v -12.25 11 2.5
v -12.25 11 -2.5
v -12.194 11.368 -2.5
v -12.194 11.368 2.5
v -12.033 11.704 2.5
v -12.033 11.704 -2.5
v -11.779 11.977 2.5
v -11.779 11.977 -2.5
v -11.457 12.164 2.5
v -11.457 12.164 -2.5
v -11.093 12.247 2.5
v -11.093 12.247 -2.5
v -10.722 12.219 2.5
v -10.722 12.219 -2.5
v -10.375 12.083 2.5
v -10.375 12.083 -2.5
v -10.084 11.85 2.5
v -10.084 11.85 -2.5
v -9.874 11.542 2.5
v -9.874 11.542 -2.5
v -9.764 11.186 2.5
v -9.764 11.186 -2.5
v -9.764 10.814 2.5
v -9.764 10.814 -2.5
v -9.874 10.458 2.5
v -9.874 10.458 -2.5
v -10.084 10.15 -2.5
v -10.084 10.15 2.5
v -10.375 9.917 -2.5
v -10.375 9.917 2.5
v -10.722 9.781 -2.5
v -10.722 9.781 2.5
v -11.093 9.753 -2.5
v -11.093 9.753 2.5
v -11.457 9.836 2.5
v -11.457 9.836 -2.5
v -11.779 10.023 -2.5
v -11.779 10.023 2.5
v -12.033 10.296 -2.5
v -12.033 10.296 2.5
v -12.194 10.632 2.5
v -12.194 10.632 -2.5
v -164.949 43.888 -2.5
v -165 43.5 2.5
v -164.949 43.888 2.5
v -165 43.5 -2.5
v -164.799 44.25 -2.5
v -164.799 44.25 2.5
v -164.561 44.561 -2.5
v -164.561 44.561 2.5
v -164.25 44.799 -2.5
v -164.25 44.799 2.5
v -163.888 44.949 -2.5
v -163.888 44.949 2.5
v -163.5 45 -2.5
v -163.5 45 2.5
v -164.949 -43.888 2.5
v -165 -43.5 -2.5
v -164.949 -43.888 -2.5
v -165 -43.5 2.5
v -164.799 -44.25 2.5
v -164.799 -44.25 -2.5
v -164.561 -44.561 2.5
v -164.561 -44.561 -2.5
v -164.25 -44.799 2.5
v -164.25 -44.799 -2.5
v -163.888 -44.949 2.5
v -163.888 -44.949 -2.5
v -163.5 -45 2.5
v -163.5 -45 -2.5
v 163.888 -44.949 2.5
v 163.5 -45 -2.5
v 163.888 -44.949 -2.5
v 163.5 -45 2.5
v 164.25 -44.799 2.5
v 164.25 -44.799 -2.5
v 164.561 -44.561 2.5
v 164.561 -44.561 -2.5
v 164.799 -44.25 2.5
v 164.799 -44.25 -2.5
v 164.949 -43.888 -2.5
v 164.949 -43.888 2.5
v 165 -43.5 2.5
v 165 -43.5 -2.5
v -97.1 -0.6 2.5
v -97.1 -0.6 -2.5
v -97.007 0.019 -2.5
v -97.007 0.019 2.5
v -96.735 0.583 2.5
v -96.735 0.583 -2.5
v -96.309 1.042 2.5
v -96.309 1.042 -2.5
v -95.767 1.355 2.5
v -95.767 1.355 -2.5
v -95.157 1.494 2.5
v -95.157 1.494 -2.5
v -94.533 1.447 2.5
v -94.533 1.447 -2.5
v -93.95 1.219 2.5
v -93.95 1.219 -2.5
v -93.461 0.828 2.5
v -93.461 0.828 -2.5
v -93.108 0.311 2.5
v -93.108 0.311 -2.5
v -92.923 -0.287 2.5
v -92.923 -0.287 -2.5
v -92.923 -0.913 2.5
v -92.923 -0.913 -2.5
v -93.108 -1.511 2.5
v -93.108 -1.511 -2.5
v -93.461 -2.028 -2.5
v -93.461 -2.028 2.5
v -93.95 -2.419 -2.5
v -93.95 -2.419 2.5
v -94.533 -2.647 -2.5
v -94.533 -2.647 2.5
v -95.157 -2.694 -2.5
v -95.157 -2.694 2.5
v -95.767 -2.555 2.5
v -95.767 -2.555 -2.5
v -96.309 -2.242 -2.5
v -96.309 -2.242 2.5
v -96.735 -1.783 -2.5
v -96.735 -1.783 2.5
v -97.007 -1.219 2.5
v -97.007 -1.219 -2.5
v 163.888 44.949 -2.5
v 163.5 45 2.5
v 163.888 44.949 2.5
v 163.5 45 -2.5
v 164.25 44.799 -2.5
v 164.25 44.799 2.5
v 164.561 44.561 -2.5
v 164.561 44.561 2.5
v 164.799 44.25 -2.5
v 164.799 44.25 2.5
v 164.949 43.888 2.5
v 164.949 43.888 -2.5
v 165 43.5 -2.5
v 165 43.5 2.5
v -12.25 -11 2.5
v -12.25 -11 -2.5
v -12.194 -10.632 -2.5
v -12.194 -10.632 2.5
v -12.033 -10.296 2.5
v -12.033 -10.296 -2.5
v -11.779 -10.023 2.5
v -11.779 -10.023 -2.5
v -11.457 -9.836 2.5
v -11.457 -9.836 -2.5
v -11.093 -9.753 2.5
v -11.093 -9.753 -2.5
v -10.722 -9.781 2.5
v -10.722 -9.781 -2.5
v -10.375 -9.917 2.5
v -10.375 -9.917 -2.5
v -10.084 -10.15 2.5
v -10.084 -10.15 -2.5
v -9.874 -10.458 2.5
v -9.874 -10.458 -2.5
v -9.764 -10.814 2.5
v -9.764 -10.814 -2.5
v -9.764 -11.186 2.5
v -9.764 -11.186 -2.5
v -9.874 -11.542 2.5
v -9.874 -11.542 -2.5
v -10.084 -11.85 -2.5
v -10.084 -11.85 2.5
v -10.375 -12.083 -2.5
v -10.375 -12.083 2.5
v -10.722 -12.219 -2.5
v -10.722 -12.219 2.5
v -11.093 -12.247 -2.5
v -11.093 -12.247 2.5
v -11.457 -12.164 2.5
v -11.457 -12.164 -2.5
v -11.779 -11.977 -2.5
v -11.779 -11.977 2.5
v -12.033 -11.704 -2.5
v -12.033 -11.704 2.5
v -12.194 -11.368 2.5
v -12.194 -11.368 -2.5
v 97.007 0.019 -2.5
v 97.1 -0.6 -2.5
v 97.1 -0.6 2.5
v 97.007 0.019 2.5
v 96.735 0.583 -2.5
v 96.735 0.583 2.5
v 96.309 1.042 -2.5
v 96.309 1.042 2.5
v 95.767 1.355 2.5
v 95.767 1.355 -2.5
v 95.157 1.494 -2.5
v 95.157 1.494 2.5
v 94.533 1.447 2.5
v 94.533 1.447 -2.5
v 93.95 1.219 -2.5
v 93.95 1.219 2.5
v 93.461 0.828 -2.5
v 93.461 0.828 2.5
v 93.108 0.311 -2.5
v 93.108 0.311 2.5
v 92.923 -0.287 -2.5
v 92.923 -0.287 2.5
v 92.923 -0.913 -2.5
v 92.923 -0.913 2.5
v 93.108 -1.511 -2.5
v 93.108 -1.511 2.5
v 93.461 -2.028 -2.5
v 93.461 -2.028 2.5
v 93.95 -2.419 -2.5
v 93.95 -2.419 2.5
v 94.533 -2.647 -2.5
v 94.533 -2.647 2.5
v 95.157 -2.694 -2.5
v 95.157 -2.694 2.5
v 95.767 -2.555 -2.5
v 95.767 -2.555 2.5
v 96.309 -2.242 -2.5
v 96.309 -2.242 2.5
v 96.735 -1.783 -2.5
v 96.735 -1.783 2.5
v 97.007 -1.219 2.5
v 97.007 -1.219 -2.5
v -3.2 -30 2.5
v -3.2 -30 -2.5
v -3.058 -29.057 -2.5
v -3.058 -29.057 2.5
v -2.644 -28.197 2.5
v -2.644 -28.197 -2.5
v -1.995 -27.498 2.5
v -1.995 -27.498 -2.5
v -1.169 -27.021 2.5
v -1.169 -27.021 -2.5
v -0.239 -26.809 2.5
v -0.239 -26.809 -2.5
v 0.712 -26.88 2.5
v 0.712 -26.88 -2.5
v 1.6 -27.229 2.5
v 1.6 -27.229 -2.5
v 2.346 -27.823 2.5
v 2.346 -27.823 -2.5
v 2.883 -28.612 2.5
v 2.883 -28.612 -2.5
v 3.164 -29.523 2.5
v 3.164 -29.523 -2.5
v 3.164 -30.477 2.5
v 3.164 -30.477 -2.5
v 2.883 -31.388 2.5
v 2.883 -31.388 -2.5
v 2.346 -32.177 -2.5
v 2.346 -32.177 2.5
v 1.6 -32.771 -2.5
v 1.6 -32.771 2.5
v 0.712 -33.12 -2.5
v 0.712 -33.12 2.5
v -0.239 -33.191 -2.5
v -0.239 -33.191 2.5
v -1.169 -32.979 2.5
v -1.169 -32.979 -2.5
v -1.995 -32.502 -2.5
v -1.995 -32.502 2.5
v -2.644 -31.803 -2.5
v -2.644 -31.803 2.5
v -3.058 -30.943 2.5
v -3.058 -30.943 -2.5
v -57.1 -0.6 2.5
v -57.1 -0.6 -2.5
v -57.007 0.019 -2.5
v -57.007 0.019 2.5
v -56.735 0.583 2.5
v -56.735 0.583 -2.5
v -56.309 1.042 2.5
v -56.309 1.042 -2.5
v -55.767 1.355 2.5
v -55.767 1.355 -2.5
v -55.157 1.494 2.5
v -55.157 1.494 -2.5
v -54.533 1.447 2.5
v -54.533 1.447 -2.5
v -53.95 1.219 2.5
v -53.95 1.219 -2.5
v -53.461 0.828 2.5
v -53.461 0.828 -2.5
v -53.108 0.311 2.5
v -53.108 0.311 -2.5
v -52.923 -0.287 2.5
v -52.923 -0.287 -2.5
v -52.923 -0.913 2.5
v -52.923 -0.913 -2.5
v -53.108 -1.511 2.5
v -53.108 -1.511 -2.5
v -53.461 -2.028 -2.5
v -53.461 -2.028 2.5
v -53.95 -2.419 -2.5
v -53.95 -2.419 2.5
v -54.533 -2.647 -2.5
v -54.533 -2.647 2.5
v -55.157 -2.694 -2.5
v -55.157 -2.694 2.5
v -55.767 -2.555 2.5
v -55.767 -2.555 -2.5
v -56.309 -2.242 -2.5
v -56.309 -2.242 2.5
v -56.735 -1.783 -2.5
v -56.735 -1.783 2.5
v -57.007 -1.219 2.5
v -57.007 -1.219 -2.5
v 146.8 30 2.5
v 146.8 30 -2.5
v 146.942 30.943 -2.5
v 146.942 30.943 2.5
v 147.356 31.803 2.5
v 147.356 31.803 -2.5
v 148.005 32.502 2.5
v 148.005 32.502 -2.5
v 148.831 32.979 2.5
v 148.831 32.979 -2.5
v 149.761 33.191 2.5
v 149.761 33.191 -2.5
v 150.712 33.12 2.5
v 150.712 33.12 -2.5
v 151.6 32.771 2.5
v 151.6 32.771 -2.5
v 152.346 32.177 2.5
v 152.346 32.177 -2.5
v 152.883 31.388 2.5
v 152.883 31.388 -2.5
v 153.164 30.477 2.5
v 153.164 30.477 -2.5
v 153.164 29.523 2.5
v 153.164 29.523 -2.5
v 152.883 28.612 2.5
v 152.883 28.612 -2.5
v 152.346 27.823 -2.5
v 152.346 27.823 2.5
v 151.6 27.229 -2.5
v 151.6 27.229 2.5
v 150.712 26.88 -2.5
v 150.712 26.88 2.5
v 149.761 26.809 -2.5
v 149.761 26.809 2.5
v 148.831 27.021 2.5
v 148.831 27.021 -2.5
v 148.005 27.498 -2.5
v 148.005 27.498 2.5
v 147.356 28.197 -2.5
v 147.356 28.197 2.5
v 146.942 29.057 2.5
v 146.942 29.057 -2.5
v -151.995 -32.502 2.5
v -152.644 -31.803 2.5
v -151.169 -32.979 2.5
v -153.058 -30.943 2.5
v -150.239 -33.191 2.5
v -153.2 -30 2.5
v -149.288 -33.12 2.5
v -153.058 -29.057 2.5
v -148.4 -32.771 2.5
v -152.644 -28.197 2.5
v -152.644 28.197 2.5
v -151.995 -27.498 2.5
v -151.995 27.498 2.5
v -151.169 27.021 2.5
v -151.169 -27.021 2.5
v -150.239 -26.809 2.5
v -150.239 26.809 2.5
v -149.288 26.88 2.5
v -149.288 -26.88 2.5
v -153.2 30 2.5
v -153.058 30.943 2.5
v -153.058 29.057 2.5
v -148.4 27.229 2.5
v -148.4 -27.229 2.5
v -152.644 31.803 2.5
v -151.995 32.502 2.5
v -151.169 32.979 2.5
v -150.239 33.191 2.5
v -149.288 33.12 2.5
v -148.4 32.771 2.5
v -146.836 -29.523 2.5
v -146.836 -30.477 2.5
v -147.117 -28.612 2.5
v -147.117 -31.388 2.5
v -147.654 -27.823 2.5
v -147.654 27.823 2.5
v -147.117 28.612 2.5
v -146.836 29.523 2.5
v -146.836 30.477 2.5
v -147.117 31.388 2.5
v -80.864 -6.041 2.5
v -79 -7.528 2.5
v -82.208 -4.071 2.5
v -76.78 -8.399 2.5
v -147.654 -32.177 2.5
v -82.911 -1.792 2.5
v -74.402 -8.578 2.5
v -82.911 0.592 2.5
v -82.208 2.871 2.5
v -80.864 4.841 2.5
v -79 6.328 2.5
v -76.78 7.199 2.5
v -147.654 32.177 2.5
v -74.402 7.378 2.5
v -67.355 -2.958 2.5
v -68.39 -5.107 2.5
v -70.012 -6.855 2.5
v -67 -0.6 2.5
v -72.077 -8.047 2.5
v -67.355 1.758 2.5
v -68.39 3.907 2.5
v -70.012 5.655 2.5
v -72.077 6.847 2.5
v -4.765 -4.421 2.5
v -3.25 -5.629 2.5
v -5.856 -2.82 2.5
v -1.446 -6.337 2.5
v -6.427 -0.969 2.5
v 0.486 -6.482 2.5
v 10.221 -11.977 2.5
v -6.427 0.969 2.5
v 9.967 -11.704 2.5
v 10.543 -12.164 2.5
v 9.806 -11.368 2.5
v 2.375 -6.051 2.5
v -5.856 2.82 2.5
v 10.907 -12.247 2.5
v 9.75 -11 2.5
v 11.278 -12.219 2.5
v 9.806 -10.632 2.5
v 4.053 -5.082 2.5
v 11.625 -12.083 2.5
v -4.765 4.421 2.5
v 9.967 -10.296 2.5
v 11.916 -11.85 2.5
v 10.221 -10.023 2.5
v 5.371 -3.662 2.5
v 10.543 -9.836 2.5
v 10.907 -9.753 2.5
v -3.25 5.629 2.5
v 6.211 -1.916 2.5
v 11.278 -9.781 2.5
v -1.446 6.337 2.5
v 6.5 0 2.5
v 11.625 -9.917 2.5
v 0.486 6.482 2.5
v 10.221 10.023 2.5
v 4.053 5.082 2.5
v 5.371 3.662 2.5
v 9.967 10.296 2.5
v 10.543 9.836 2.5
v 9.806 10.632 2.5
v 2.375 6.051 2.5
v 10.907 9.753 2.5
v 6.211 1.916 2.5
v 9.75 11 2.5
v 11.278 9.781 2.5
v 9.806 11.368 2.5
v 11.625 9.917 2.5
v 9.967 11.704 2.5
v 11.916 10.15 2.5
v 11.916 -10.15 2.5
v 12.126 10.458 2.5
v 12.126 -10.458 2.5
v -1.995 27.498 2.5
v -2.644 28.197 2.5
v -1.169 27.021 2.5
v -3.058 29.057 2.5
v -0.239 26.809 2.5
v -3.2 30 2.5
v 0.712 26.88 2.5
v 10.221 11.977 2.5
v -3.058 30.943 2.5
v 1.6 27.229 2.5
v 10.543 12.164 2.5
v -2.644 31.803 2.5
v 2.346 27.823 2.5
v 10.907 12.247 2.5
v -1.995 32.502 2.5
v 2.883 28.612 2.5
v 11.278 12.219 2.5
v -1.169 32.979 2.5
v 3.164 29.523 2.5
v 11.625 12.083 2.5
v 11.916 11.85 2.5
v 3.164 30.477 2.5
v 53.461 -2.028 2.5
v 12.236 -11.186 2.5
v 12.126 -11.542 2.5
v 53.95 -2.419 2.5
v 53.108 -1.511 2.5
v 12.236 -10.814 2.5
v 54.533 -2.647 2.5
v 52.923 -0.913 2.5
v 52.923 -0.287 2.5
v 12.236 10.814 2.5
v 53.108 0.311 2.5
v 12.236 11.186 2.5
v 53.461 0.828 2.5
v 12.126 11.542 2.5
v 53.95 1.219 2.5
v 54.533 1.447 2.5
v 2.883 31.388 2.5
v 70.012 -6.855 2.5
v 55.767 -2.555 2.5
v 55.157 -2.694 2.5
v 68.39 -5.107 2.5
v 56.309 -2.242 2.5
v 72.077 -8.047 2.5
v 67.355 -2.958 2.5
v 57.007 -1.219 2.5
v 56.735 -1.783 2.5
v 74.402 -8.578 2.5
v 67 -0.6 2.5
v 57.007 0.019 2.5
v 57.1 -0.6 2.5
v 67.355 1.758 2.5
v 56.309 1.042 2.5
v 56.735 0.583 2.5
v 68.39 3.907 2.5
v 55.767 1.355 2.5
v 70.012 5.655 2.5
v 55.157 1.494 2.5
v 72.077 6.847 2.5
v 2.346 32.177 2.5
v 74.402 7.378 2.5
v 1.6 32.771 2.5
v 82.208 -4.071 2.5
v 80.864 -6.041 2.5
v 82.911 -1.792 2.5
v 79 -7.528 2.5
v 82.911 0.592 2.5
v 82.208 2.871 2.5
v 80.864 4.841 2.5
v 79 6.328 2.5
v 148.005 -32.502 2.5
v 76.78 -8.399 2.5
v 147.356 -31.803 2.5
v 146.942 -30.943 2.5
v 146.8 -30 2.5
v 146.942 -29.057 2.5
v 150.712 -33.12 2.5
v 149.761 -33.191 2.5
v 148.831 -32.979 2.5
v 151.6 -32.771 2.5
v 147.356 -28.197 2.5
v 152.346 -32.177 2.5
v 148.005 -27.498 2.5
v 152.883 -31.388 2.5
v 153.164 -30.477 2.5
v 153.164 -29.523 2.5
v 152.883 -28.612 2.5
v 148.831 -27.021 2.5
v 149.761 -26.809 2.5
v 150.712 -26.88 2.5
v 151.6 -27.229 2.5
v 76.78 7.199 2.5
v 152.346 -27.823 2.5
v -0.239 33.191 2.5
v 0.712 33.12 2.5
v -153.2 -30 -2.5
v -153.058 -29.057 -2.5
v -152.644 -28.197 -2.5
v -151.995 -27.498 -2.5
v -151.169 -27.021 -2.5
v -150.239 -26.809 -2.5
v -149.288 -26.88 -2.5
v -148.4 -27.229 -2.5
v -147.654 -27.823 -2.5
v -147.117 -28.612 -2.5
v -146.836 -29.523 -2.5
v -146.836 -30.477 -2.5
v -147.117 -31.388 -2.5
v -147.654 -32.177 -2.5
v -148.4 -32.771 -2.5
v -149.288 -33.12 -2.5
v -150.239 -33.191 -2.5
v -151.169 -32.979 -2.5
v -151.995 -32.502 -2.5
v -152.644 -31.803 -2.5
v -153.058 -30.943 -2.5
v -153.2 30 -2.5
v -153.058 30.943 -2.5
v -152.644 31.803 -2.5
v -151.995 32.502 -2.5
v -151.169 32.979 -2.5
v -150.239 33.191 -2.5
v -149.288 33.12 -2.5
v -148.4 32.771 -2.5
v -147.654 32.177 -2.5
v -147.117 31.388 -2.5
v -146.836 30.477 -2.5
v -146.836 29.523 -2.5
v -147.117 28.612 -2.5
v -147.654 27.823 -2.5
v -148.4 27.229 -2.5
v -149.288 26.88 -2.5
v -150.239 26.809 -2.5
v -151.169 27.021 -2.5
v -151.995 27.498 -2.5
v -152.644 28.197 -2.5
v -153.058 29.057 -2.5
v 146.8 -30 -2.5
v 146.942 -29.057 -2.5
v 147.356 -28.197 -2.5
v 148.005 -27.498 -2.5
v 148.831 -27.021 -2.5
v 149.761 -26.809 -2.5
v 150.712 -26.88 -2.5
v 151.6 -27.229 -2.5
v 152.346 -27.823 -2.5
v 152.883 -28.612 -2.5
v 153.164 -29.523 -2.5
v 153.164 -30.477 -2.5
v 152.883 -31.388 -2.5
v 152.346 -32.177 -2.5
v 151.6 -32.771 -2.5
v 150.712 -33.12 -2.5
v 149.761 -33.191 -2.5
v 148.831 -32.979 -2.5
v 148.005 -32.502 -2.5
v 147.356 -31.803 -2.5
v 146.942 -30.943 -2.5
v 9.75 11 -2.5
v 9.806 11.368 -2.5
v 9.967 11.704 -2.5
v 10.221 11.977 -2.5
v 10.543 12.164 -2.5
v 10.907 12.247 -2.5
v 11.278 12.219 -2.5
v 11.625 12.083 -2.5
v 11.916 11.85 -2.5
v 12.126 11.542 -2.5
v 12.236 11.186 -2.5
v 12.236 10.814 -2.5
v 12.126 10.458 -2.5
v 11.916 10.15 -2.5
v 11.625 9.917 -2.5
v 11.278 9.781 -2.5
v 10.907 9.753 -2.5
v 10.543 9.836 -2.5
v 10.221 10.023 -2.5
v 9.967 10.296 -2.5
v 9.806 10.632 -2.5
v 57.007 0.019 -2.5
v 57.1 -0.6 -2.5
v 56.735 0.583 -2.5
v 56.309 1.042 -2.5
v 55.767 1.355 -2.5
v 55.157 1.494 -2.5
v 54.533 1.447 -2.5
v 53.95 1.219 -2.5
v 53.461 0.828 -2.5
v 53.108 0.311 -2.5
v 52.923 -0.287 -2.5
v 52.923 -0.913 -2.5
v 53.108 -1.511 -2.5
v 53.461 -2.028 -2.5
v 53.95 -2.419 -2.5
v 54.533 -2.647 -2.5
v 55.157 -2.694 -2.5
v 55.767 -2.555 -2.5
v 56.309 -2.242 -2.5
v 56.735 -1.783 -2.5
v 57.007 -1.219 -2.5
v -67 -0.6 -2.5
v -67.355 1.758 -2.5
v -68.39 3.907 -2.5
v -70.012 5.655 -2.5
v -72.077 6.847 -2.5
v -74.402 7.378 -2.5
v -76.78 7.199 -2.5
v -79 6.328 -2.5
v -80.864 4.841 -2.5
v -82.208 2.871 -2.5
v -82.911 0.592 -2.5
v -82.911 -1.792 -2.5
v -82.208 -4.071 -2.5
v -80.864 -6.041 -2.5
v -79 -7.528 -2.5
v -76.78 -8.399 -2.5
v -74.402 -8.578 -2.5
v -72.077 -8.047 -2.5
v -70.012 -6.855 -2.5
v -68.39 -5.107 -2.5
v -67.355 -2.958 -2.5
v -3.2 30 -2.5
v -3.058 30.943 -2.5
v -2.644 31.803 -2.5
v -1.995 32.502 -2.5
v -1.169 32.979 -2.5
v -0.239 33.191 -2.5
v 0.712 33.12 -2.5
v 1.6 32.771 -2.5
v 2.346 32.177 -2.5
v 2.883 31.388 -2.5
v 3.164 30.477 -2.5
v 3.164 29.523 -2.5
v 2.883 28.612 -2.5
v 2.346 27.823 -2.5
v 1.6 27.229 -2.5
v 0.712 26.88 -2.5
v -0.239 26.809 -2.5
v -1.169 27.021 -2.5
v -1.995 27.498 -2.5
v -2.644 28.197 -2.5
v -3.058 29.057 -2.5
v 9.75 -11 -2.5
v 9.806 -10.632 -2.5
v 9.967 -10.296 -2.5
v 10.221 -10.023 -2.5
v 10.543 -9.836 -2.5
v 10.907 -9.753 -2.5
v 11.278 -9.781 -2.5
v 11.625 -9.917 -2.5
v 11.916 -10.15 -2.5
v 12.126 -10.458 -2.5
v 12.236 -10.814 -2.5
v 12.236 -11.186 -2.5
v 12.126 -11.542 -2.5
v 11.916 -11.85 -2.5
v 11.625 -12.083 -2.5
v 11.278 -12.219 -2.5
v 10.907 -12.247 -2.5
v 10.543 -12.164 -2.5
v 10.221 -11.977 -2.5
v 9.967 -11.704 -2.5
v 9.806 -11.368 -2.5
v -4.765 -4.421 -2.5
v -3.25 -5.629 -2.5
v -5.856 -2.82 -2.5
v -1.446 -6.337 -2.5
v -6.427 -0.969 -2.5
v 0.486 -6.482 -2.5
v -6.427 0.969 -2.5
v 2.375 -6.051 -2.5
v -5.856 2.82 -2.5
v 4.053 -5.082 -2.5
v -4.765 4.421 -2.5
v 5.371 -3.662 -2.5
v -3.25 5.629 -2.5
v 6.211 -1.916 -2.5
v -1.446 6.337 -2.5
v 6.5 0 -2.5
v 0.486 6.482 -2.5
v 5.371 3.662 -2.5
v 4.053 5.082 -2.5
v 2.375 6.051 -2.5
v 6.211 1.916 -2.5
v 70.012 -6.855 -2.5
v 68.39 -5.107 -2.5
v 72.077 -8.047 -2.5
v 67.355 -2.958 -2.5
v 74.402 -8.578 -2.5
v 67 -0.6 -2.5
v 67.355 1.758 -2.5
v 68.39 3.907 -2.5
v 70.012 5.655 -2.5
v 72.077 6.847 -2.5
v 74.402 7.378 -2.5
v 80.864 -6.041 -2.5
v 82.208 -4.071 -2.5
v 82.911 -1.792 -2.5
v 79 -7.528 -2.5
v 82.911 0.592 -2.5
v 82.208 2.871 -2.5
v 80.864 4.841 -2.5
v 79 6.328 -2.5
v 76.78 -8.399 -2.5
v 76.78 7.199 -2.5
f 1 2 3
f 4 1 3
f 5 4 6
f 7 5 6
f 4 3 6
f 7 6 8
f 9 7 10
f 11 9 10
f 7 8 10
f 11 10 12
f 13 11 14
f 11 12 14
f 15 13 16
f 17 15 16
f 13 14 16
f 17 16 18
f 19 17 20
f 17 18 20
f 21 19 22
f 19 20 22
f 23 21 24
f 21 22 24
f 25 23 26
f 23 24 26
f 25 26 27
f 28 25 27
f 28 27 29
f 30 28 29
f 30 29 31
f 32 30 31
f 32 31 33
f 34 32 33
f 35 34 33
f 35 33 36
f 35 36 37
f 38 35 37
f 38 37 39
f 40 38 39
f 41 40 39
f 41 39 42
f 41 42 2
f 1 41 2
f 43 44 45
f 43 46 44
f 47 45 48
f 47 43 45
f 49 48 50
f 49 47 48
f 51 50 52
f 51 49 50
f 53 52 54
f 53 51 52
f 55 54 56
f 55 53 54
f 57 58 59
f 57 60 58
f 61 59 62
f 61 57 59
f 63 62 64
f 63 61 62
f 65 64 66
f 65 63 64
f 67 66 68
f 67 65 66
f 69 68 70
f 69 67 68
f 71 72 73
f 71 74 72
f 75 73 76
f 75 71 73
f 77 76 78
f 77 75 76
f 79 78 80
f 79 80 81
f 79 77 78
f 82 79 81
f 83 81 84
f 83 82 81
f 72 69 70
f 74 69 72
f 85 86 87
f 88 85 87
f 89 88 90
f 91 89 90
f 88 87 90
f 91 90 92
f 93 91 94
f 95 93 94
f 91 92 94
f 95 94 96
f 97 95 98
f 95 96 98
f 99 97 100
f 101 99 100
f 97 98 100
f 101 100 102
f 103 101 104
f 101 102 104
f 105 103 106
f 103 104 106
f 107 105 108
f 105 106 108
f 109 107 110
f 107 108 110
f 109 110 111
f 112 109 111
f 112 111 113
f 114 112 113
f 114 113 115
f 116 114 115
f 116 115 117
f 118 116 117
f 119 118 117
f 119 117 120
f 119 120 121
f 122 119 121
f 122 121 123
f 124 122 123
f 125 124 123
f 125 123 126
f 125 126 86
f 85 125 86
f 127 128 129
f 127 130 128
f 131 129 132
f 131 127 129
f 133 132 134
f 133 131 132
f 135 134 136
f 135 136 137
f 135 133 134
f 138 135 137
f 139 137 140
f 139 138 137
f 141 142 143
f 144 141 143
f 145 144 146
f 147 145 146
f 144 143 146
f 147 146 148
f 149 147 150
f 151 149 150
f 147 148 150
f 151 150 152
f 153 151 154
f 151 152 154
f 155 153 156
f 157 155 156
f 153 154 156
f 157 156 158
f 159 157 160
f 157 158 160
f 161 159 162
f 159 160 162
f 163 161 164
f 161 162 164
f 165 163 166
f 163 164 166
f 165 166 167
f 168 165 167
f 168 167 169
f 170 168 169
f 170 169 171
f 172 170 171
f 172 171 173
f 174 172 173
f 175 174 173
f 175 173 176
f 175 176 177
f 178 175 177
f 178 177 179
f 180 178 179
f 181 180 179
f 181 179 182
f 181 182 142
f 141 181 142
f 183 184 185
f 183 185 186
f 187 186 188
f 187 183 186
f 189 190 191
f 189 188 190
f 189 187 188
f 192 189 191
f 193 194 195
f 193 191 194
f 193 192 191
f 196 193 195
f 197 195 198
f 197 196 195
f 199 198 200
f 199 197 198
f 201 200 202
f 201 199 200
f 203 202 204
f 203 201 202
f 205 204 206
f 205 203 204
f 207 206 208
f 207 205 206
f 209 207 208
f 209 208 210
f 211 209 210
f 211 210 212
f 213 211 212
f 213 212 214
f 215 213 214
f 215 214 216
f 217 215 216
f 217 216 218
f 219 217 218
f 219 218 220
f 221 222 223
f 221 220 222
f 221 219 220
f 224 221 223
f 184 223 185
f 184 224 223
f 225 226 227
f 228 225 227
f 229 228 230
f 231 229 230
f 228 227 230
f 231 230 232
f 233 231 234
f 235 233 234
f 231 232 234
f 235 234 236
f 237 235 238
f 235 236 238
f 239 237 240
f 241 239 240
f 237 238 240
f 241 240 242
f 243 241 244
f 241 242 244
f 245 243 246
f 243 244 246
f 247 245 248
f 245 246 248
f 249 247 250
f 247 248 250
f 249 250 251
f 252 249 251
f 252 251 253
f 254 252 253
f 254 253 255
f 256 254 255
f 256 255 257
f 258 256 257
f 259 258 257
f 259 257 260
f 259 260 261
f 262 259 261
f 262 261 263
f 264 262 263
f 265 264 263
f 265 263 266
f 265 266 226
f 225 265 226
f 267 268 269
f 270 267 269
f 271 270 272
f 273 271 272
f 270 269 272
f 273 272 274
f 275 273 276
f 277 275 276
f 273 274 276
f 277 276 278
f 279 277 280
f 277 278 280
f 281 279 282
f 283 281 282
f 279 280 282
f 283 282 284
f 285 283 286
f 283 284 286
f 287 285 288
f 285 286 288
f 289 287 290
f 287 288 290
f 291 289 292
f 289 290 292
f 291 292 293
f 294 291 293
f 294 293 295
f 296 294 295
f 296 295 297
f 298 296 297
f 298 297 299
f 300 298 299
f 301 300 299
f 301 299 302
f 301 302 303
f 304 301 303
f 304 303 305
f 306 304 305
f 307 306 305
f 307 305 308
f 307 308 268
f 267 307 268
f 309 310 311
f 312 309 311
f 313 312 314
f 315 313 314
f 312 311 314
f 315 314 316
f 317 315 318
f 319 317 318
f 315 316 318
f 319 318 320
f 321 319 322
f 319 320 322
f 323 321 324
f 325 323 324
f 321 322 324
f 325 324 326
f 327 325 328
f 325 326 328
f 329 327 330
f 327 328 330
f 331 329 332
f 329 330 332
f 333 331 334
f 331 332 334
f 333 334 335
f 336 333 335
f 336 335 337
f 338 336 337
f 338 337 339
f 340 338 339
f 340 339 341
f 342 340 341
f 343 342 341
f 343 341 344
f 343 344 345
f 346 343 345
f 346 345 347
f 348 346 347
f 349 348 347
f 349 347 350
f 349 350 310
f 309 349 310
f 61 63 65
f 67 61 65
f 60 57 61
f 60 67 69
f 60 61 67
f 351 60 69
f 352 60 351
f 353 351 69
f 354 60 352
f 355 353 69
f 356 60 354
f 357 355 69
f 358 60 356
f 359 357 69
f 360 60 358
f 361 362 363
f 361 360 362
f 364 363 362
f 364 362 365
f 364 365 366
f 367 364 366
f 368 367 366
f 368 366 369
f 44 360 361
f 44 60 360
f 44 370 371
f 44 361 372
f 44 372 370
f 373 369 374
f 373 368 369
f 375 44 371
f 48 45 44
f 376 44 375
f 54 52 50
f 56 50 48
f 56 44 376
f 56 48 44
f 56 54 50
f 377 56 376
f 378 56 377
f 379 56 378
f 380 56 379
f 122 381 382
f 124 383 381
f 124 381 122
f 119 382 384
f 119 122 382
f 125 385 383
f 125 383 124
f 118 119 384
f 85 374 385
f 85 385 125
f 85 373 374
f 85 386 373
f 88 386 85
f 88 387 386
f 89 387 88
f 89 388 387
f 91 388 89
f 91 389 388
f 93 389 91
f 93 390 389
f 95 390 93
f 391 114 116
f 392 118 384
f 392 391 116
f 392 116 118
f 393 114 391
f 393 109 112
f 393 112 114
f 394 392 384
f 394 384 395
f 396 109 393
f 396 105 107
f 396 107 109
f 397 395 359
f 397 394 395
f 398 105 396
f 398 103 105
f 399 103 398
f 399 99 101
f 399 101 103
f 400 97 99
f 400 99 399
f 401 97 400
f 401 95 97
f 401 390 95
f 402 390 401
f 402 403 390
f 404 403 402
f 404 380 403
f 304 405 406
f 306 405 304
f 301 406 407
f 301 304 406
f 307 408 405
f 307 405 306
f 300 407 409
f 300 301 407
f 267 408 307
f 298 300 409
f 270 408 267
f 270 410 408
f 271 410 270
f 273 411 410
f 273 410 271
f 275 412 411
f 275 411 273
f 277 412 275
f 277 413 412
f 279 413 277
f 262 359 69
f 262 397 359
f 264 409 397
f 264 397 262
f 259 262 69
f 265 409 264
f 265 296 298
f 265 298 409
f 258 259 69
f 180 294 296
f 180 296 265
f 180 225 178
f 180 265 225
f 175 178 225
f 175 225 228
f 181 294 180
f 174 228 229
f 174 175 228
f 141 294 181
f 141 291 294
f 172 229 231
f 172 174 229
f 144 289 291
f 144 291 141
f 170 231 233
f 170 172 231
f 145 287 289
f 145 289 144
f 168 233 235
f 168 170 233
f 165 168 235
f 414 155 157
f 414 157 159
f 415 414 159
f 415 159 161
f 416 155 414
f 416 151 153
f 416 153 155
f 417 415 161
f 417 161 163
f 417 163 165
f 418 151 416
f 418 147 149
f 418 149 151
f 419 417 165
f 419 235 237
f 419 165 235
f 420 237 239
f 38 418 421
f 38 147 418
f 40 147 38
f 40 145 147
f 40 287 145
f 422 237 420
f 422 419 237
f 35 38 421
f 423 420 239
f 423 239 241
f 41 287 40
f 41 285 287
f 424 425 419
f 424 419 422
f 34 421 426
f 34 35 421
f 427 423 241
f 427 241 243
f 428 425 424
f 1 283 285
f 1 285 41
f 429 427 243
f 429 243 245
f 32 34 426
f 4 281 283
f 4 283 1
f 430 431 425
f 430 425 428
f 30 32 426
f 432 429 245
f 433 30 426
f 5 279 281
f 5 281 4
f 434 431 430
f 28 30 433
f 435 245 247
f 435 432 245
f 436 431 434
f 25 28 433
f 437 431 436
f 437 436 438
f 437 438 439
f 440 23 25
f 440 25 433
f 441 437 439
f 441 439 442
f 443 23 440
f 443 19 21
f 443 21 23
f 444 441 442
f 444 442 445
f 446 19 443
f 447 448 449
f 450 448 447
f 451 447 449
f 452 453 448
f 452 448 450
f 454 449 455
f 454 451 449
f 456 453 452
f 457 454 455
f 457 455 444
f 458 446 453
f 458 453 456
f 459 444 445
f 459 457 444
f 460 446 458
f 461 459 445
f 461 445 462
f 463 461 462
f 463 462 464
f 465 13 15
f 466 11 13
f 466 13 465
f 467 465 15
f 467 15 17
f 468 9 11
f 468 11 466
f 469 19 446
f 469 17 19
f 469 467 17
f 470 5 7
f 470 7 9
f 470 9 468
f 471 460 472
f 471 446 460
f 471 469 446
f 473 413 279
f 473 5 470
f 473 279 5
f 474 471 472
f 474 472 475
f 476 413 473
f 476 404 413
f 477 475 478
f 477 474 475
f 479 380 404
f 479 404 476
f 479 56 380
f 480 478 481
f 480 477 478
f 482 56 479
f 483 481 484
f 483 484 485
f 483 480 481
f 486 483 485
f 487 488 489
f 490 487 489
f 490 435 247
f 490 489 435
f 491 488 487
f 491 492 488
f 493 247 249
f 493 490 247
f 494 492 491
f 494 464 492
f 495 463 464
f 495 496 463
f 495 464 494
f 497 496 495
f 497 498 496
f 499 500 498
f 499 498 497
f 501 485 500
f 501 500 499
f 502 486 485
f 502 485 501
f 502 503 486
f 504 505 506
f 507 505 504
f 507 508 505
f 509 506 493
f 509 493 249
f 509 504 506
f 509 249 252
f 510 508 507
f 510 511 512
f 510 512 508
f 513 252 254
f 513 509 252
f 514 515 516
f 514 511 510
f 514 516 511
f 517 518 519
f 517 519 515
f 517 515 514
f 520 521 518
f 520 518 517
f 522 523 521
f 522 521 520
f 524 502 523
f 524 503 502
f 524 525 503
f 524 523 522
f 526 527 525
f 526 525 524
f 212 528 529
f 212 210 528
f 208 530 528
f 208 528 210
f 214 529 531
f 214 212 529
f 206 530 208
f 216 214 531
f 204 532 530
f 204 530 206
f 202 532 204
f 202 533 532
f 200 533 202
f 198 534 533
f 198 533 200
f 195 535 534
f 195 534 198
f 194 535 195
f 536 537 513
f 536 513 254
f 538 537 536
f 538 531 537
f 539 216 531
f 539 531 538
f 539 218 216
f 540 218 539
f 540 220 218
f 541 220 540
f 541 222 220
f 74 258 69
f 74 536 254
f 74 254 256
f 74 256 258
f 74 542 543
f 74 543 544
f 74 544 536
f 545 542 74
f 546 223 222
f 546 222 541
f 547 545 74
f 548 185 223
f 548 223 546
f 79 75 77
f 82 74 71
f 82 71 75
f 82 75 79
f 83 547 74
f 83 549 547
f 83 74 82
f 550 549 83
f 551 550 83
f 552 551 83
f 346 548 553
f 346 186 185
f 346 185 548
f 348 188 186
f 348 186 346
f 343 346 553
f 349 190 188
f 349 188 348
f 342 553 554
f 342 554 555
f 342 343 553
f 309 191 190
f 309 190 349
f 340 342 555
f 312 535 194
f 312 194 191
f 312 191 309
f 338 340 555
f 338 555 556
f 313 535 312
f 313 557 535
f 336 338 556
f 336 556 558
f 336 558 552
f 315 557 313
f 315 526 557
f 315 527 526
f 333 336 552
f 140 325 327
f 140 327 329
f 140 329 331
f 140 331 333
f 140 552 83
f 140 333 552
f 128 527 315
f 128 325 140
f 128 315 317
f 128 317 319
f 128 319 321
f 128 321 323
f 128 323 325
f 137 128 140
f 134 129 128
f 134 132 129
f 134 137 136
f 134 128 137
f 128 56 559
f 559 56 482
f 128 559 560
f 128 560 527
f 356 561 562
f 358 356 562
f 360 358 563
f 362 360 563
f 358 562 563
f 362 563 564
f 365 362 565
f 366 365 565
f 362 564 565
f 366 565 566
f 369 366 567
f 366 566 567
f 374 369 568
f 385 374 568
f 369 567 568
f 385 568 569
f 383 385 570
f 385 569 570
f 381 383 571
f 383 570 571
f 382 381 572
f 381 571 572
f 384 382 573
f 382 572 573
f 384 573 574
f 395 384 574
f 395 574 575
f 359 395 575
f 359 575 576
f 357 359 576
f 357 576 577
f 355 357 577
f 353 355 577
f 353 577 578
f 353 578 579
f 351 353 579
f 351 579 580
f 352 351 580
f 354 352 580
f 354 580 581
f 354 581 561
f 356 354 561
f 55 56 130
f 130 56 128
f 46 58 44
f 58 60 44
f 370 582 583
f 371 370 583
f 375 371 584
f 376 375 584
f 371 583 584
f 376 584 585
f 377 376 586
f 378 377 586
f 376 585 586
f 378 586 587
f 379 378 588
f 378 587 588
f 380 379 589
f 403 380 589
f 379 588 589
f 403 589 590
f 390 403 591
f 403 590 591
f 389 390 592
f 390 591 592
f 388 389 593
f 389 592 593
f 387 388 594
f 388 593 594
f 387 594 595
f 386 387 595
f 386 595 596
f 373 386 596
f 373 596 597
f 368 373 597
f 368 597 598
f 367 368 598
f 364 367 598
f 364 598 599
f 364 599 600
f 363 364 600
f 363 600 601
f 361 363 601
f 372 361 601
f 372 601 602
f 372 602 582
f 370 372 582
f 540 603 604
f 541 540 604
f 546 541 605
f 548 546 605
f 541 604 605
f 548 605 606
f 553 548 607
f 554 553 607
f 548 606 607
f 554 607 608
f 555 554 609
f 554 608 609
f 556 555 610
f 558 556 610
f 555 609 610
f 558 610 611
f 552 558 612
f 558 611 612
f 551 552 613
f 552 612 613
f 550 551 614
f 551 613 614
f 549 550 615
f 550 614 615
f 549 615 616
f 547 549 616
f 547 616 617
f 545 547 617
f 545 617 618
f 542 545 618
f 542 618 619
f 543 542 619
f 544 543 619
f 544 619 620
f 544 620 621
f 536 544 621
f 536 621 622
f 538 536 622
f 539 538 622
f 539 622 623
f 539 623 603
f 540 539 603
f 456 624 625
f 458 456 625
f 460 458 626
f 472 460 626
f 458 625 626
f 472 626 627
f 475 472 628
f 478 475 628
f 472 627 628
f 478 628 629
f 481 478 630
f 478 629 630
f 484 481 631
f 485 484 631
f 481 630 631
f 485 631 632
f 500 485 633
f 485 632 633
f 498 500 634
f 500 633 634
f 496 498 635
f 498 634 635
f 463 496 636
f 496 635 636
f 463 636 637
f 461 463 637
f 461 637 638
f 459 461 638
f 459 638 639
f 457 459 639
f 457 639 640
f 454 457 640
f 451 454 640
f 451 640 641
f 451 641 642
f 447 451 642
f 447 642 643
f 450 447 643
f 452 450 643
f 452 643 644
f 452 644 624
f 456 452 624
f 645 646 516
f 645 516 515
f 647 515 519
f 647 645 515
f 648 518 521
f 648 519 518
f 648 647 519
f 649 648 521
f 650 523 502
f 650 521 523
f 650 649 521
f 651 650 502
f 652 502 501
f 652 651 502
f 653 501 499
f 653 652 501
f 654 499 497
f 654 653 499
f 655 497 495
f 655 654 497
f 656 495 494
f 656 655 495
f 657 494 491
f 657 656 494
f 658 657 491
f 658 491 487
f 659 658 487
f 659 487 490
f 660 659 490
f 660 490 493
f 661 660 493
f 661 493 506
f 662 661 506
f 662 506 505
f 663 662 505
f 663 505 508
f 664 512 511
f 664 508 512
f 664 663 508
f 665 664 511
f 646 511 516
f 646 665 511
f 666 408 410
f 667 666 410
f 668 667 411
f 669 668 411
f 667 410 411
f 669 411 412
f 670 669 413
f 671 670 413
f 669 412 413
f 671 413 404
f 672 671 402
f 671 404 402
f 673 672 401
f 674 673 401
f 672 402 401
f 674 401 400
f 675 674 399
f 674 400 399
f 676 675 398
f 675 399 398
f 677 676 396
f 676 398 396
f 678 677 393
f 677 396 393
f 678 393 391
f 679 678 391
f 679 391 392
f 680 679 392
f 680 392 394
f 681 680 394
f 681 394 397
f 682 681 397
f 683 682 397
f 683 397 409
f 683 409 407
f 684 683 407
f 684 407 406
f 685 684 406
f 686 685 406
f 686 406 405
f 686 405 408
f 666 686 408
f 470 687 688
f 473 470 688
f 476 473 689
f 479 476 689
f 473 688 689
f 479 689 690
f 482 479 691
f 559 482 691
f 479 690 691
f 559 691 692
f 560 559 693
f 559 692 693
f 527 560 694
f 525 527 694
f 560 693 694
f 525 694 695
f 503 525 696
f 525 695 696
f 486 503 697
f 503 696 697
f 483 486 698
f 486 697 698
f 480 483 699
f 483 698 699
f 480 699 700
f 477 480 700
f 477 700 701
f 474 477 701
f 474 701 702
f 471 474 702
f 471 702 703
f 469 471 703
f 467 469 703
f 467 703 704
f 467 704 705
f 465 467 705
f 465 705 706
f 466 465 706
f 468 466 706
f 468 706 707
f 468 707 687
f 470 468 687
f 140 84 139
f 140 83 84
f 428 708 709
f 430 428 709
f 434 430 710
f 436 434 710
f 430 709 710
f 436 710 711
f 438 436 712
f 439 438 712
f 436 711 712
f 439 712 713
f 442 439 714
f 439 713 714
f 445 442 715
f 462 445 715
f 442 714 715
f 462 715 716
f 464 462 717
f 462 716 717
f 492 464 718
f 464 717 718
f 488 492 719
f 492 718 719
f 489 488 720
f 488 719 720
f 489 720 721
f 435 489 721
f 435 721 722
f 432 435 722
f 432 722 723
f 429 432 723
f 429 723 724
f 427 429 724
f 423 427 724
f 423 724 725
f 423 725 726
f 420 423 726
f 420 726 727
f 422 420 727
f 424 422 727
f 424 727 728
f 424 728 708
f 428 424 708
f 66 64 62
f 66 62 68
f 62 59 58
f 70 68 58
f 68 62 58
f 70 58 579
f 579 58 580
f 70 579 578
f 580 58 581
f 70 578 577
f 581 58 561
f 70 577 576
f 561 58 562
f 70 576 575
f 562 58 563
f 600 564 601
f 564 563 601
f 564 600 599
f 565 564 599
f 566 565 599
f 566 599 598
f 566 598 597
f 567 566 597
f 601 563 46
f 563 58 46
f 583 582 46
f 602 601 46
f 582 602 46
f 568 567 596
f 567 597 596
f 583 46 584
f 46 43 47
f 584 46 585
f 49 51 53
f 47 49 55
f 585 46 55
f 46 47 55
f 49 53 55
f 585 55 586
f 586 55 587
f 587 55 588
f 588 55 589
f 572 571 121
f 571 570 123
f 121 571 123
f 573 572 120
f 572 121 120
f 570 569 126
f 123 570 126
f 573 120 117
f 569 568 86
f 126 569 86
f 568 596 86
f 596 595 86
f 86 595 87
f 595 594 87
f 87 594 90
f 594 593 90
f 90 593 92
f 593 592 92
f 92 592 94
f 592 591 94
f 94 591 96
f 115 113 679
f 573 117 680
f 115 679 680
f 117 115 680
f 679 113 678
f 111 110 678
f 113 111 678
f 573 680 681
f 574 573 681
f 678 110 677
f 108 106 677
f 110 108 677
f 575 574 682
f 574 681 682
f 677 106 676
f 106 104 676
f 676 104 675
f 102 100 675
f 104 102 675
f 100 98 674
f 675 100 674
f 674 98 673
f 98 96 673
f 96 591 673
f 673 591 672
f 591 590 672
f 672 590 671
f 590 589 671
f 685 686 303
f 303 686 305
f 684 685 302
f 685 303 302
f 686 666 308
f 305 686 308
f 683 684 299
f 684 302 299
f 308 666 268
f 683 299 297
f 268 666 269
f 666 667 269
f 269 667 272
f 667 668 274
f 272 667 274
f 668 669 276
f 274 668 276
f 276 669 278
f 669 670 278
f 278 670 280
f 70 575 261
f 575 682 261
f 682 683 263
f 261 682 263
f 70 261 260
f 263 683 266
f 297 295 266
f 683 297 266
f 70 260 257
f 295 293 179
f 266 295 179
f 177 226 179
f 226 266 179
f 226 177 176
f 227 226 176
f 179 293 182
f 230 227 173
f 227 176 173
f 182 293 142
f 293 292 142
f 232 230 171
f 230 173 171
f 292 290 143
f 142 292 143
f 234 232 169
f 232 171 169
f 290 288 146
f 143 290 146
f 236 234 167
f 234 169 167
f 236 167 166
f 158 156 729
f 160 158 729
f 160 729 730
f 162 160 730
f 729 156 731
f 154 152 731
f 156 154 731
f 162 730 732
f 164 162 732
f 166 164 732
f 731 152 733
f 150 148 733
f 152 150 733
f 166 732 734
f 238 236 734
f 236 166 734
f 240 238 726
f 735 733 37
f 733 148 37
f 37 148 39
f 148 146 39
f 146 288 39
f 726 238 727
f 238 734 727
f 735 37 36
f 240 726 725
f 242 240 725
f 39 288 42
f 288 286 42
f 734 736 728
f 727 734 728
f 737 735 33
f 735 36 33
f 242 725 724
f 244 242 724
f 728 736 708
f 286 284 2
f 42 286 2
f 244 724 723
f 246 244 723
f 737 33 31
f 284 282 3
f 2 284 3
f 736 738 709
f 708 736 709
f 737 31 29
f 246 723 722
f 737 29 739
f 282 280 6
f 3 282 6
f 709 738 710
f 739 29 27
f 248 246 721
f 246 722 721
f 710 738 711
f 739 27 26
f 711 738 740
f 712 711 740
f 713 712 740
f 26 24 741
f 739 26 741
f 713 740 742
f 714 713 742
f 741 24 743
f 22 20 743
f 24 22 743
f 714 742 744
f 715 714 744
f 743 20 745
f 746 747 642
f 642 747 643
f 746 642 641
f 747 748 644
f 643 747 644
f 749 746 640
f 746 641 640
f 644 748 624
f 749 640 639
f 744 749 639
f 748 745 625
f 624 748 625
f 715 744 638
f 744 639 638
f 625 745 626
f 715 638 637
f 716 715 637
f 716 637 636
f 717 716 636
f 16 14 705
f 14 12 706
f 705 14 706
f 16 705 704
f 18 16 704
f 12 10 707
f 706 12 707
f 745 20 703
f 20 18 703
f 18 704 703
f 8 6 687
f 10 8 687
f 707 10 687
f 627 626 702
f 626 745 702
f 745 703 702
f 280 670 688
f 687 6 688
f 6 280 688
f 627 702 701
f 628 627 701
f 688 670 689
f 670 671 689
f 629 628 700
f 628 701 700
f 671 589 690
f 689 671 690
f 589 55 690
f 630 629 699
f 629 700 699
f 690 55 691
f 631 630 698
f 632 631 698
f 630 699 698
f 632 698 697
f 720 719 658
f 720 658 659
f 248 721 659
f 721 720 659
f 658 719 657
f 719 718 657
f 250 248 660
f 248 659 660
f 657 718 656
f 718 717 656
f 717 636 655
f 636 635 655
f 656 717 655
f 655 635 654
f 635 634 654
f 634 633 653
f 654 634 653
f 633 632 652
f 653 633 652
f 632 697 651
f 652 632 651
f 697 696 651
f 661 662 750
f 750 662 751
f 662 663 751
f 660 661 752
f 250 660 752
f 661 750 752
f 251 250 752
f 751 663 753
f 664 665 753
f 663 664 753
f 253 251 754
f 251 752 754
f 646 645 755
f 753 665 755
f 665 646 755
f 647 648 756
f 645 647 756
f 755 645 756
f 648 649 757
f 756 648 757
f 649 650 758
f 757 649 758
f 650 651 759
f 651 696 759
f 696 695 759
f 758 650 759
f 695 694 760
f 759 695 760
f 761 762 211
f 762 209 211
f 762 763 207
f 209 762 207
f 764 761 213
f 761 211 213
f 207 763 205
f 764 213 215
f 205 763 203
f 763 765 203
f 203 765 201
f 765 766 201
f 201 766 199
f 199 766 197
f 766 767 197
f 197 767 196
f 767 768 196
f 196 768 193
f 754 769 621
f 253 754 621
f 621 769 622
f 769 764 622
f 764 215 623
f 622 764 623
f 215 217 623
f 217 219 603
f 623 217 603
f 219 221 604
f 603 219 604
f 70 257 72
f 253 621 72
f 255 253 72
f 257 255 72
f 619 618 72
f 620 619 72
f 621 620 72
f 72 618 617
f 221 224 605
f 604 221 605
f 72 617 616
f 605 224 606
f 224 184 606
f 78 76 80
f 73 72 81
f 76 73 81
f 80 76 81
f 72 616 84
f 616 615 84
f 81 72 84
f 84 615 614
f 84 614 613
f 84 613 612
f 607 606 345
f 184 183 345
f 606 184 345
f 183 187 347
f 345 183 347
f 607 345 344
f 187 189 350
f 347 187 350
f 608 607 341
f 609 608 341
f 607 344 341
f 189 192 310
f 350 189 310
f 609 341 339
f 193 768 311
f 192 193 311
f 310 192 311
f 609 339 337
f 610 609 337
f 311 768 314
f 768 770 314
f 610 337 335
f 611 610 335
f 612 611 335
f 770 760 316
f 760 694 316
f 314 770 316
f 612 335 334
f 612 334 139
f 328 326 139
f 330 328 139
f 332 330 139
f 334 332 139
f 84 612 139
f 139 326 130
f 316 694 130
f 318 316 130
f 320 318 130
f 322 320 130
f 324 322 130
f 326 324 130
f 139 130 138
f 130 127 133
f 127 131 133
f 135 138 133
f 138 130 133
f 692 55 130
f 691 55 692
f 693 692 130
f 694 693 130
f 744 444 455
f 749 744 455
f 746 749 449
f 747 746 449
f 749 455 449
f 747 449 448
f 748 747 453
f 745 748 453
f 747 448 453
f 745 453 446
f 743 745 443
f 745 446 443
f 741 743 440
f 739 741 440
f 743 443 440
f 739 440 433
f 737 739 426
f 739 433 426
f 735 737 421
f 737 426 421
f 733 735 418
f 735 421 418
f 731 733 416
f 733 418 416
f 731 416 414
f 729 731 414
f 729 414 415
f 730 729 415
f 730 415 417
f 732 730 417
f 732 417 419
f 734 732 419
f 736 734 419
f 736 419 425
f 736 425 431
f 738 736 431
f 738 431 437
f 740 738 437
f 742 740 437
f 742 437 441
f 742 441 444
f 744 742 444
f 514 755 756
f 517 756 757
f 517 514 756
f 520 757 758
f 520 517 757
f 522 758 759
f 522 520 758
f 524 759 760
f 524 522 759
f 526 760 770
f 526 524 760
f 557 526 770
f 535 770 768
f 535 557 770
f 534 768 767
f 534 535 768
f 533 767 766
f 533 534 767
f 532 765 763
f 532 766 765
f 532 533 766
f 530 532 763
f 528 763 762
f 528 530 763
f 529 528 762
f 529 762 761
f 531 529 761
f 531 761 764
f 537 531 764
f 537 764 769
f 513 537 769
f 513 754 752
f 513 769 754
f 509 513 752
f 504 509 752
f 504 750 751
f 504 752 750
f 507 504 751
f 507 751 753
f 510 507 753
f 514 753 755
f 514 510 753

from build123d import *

# Parameters (mm, degrees)
SKETCH1_W                = 330
SKETCH1_H                = 90
BOSS_EXTRUDE1_DEPTH      = 2.5
M6_CLEARANCE_HOLE1_D     = 6.4
M6_CLEARANCE_HOLE1_DEPTH = 10
M6_CLEARANCE_HOLE1_TIP   = 1.922753981
SKETCH3_R                = 8
CUT_EXTRUDE2_DEPTH       = 6
M5X0_8_TAPPED_HOLE1_D    = 4.2
SKETCH4_R                = 6.5
CUT_EXTRUDE3_DEPTH       = 6
M3X0_5_TAPPED_HOLE1_D    = 2.5
FILLET1_R                = 1.5


with BuildPart() as part:
    # Sketch1 → Boss-Extrude1 (new body, symmetric)
    with BuildSketch(Plane.XY):
        Rectangle(SKETCH1_W, SKETCH1_H)
    extrude(amount=BOSS_EXTRUDE1_DEPTH, both=True)

    # M6 Clearance Hole1
    with Locations(Plane.XY.offset(2.5)):
        with Locations((-150, 30), (-150, -30), (0, 30), (0, -30), (150, -30), (150, 30)):
            Hole(M6_CLEARANCE_HOLE1_D / 2, depth=M6_CLEARANCE_HOLE1_DEPTH)
            with Locations((0, 0, -(M6_CLEARANCE_HOLE1_DEPTH + M6_CLEARANCE_HOLE1_TIP / 2))):  # 118° drill point
                Cone(0, M6_CLEARANCE_HOLE1_D / 2, M6_CLEARANCE_HOLE1_TIP, mode=Mode.SUBTRACT)

    # Sketch3 → Cut-Extrude2 (cut, through all)
    with BuildSketch(Plane.XY.offset(2.5)):
        with Locations((-75, -0.6)):
            Circle(SKETCH3_R)
    cut_extrude2 = extrude(amount=-CUT_EXTRUDE2_DEPTH, mode=Mode.SUBTRACT)

    # M5x0.8 Tapped Hole1 (through all)
    with Locations(Plane.XY.offset(2.5)):
        with Locations((-95, -0.6), (-55, -0.6)):
            m5x0_8_tapped_hole1 = Hole(M5X0_8_TAPPED_HOLE1_D / 2)

    # Mirror1: Cut-Extrude2, M5x0.8 Tapped Hole1 across plane
    add(cut_extrude2.mirror(Plane(origin=(0, 0, 0), x_dir=(0, 0, 1), z_dir=(1, 0, 0))), mode=Mode.SUBTRACT)
    add(m5x0_8_tapped_hole1.mirror(Plane(origin=(0, 0, 0), x_dir=(0, 0, 1), z_dir=(1, 0, 0))), mode=Mode.SUBTRACT)

    # Sketch4 → Cut-Extrude3 (cut, through all)
    with BuildSketch(Plane.XY.offset(2.5)):
        Circle(SKETCH4_R)
    extrude(amount=-CUT_EXTRUDE3_DEPTH, mode=Mode.SUBTRACT)

    # M3x0.5 Tapped Hole1 (through all)
    with Locations(Plane.XY.offset(2.5)):
        with Locations((11, 11), (-11, -11), (-11, 11), (11, -11)):
            Hole(M3X0_5_TAPPED_HOLE1_D / 2)

    # Fillet1
    fillet1_edges = [part.edges().sort_by_distance(p)[0] for p in [
        (165, -45, 0),
        (-165, -45, 0),
        (-165, 45, 0),
        (165, 45, 0),
    ]]
    fillet(fillet1_edges, radius=FILLET1_R)


solid = part.part
